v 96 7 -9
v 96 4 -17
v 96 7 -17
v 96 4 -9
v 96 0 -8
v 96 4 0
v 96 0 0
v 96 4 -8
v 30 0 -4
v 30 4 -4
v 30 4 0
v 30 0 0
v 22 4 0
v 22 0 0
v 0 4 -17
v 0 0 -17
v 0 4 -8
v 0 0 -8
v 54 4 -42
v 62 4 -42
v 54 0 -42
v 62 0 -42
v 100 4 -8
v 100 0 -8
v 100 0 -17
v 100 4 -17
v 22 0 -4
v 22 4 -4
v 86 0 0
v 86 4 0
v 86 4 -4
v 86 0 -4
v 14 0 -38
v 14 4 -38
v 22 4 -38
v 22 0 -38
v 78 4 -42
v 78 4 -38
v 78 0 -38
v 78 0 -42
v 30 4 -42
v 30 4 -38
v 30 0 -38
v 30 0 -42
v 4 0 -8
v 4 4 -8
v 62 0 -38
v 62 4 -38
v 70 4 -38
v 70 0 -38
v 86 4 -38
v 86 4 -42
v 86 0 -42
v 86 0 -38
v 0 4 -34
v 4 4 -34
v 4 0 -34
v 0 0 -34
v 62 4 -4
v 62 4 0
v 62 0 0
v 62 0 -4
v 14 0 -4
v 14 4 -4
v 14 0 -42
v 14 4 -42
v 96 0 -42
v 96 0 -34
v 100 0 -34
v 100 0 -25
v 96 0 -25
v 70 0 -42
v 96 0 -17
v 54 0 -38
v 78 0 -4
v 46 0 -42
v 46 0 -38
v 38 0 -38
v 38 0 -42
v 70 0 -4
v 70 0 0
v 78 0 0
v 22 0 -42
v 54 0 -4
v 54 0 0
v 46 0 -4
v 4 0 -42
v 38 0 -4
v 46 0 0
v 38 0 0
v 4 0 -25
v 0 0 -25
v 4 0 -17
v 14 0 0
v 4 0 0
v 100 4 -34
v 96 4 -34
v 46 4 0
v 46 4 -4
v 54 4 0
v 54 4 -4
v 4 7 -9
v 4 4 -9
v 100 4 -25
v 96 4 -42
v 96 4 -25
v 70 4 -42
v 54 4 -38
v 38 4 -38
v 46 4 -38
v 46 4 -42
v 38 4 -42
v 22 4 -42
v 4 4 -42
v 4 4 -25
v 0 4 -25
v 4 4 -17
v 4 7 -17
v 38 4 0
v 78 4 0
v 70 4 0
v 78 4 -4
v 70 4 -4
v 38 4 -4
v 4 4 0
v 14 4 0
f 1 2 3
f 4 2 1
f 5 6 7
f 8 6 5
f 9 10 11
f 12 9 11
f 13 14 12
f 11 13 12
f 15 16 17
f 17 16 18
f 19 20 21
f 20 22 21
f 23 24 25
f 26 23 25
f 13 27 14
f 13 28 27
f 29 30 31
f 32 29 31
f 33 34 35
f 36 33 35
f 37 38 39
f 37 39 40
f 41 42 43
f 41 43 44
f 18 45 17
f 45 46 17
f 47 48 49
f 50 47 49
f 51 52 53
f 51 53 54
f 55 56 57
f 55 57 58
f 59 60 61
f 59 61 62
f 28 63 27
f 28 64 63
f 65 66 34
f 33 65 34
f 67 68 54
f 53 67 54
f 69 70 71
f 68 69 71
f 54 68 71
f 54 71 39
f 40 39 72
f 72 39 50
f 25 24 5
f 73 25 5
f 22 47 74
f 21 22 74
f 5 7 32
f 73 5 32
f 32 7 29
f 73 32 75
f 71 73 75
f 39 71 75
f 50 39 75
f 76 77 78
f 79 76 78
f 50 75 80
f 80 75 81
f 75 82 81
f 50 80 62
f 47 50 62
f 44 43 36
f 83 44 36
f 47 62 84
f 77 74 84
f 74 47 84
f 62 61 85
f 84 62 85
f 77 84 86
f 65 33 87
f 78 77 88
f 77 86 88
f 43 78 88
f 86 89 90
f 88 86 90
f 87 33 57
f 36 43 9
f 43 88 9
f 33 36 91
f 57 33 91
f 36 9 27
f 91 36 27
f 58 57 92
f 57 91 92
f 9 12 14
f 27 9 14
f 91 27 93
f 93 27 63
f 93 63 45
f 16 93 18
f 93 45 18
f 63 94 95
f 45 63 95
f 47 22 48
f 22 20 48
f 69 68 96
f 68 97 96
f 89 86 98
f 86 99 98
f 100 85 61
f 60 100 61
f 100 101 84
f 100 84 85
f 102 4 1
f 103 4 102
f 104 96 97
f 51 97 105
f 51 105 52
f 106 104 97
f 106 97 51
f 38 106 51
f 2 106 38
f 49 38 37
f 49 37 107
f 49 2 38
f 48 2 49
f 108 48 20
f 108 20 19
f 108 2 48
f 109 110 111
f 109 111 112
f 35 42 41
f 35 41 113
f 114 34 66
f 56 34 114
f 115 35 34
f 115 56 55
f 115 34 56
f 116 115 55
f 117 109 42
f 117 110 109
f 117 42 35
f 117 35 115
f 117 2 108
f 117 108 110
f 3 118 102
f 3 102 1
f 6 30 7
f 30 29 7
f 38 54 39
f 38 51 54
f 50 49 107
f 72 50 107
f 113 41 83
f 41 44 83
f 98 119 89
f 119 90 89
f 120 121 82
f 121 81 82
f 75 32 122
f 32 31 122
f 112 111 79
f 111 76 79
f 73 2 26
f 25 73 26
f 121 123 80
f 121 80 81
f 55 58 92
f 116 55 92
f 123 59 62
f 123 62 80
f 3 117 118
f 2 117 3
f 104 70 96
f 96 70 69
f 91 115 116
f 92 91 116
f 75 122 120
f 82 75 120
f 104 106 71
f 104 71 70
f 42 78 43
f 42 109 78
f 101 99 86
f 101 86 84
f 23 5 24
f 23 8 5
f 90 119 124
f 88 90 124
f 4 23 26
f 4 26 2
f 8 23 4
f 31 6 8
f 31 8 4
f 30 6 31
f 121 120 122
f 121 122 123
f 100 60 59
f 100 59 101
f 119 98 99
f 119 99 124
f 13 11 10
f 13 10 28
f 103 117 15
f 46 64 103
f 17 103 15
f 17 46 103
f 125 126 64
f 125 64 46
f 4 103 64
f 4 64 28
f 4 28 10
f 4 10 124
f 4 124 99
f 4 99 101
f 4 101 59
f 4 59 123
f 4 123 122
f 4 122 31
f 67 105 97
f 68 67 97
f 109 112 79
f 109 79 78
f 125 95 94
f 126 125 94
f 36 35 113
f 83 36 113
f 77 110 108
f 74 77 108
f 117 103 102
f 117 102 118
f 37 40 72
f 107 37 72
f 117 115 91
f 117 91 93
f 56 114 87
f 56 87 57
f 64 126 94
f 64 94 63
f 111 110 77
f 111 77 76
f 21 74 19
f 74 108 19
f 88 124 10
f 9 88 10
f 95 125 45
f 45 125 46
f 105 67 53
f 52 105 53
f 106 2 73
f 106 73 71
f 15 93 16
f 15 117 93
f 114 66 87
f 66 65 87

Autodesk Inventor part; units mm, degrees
ref_plane "YZ Plane" through (0, 0, 0) normal (1, 0, 0) x (0, 1, 0)
ref_plane "XZ Plane" through (0, 0, 0) normal (0, 1, 0) x (-1, 0, 0)
ref_plane "XY Plane" through (0, 0, 0) normal (0, 0, 1) x (1, 0, 0)
sketch "Sketch1" plane through (0, 0, 0) normal (0, 1, 0) x (-1, 0, 0)
  line L0 (0, 0) -> (-100, 0)
  line L1 (-100, 0) -> (-100, -42)
  line L2 (-100, -42) -> (0, -42)
  line L3 (0, -42) -> (0, 0)
  dimension "d0" = 100
  dimension "d1" = 42
extrude "Extrusion1" add sketch "Sketch1" along normal blind 4
sketch "Sketch2" plane through (0, 4, 0) normal (0, 1, 0) x (1, 0, 0)
  line L0 (0, 0) -> (100, 0) construction
  line L1 (100, 0) -> (100, 42) construction
  line L2 (100, 42) -> (0, 42) construction
  line L3 (0, 42) -> (0, 0) construction
  line L4 (4, 38) -> (96, 38) construction
  line L5 (96, 38) -> (96, 4) construction
  line L6 (96, 4) -> (4, 4) construction
  line L7 (4, 4) -> (4, 38) construction
  line L8 (100, 42) -> (0, 42) projected
  line L9 (4, 42) -> (4, 34)
  line L10 (4, 34) -> (0, 34)
  line L11 (0, 42) -> (0, 0) projected
  line L12 (0, 34) -> (0, 42)
  line L13 (0, 42) -> (4, 42)
  line L14 (0, 21) -> (100, 21) construction
  line L15 (50, 42) -> (50, 0) construction
  line L16 (0, 0) -> (100, 0) construction
  line L17 (0, 21) -> (0, 25)
  line L18 (4, 25) -> (0, 25)
  line L19 (4, 25) -> (4, 21)
  line L20 (14, 42) -> (14, 38)
  line L21 (14, 38) -> (22, 38)
  line L22 (22, 38) -> (22, 42)
  line L23 (14, 42) -> (22, 42)
  line L24 (30, 42) -> (38, 42)
  line L25 (38, 42) -> (38, 38)
  line L26 (38, 38) -> (30, 38)
  line L27 (30, 38) -> (30, 42)
  line L28 (50, 38) -> (46, 38)
  line L29 (46, 38) -> (46, 42)
  line L30 (46, 42) -> (50, 42)
  line L31 (4, 0) -> (4, 8)
  line L32 (4, 8) -> (0, 8)
  line L33 (0, 8) -> (0, 0)
  line L34 (0, 0) -> (4, 0)
  line L35 (0, 21) -> (0, 17)
  line L36 (4, 17) -> (0, 17)
  line L37 (4, 17) -> (4, 21)
  line L38 (14, 0) -> (14, 4)
  line L39 (14, 4) -> (22, 4)
  line L40 (22, 4) -> (22, 0)
  line L41 (14, 0) -> (22, 0)
  line L42 (30, 0) -> (38, 0)
  line L43 (38, 0) -> (38, 4)
  line L44 (38, 4) -> (30, 4)
  line L45 (30, 4) -> (30, 0)
  line L46 (50, 4) -> (46, 4)
  line L47 (46, 4) -> (46, 0)
  line L48 (46, 0) -> (50, 0)
  line L49 (100, 42) -> (100, 0) construction
  line L50 (96, 4) -> (96, 38) construction
  line L51 (96, 42) -> (96, 34)
  line L52 (96, 34) -> (100, 34)
  line L53 (100, 42) -> (100, 0)
  line L54 (100, 34) -> (100, 42)
  line L55 (100, 42) -> (96, 42)
  line L56 (100, 21) -> (100, 25)
  line L57 (96, 25) -> (100, 25)
  line L58 (96, 25) -> (96, 21)
  line L59 (86, 42) -> (86, 38)
  line L60 (86, 38) -> (78, 38)
  line L61 (78, 38) -> (78, 42)
  line L62 (86, 42) -> (78, 42)
  line L63 (70, 42) -> (62, 42)
  line L64 (62, 42) -> (62, 38)
  line L65 (62, 38) -> (70, 38)
  line L66 (70, 38) -> (70, 42)
  line L67 (50, 38) -> (54, 38)
  line L68 (54, 38) -> (54, 42)
  line L69 (54, 42) -> (50, 42)
  line L70 (70, 4) -> (70, 0)
  line L71 (62, 4) -> (70, 4)
  line L72 (70, 0) -> (62, 0)
  line L73 (62, 0) -> (62, 4)
  line L74 (54, 4) -> (54, 0)
  line L75 (50, 4) -> (54, 4)
  line L76 (54, 0) -> (50, 0)
  line L77 (78, 4) -> (78, 0)
  line L78 (86, 4) -> (78, 4)
  line L79 (86, 0) -> (78, 0)
  line L80 (86, 0) -> (86, 4)
  line L81 (96, 0) -> (96, 8)
  line L82 (100, 0) -> (96, 0)
  line L83 (96, 8) -> (100, 8)
  line L84 (100, 8) -> (100, 0)
  line L85 (96, 17) -> (96, 21)
  line L86 (100, 21) -> (100, 17)
  line L87 (96, 17) -> (100, 17)
  dimension "d4" = 4
  dimension "d5" = 4
  dimension "d7" = 8
  dimension "d8" = 8
  dimension "d10" = 8
  dimension "d11" = 8
  dimension "d13" = 4
  dimension "d14" = 8
extrude "Extrusion2" cut sketch "Sketch2" against normal up to surface (4 mm away)
sketch "Sketch3" plane through (0, 4, 0) normal (0, 1, 0) x (1, 0, 0)
  line L0 (4, 25) -> (4, 17) projected
  line L1 (96, 0) -> (96, 8) projected
  line L2 (4, 17) -> (96, 17)
  line L3 (96, 17) -> (96, 9)
  line L4 (96, 9) -> (4, 9)
  line L5 (4, 9) -> (4, 17)
  line L6 (30, 4) -> (38, 4) projected
  point P0 (0, 0)
  dimension "d17" = 5
  dimension "d18" = 8
extrude "Extrusion3" add sketch "Sketch3" along normal blind 3
properties part number "front" material "PBT Plastic Black"
